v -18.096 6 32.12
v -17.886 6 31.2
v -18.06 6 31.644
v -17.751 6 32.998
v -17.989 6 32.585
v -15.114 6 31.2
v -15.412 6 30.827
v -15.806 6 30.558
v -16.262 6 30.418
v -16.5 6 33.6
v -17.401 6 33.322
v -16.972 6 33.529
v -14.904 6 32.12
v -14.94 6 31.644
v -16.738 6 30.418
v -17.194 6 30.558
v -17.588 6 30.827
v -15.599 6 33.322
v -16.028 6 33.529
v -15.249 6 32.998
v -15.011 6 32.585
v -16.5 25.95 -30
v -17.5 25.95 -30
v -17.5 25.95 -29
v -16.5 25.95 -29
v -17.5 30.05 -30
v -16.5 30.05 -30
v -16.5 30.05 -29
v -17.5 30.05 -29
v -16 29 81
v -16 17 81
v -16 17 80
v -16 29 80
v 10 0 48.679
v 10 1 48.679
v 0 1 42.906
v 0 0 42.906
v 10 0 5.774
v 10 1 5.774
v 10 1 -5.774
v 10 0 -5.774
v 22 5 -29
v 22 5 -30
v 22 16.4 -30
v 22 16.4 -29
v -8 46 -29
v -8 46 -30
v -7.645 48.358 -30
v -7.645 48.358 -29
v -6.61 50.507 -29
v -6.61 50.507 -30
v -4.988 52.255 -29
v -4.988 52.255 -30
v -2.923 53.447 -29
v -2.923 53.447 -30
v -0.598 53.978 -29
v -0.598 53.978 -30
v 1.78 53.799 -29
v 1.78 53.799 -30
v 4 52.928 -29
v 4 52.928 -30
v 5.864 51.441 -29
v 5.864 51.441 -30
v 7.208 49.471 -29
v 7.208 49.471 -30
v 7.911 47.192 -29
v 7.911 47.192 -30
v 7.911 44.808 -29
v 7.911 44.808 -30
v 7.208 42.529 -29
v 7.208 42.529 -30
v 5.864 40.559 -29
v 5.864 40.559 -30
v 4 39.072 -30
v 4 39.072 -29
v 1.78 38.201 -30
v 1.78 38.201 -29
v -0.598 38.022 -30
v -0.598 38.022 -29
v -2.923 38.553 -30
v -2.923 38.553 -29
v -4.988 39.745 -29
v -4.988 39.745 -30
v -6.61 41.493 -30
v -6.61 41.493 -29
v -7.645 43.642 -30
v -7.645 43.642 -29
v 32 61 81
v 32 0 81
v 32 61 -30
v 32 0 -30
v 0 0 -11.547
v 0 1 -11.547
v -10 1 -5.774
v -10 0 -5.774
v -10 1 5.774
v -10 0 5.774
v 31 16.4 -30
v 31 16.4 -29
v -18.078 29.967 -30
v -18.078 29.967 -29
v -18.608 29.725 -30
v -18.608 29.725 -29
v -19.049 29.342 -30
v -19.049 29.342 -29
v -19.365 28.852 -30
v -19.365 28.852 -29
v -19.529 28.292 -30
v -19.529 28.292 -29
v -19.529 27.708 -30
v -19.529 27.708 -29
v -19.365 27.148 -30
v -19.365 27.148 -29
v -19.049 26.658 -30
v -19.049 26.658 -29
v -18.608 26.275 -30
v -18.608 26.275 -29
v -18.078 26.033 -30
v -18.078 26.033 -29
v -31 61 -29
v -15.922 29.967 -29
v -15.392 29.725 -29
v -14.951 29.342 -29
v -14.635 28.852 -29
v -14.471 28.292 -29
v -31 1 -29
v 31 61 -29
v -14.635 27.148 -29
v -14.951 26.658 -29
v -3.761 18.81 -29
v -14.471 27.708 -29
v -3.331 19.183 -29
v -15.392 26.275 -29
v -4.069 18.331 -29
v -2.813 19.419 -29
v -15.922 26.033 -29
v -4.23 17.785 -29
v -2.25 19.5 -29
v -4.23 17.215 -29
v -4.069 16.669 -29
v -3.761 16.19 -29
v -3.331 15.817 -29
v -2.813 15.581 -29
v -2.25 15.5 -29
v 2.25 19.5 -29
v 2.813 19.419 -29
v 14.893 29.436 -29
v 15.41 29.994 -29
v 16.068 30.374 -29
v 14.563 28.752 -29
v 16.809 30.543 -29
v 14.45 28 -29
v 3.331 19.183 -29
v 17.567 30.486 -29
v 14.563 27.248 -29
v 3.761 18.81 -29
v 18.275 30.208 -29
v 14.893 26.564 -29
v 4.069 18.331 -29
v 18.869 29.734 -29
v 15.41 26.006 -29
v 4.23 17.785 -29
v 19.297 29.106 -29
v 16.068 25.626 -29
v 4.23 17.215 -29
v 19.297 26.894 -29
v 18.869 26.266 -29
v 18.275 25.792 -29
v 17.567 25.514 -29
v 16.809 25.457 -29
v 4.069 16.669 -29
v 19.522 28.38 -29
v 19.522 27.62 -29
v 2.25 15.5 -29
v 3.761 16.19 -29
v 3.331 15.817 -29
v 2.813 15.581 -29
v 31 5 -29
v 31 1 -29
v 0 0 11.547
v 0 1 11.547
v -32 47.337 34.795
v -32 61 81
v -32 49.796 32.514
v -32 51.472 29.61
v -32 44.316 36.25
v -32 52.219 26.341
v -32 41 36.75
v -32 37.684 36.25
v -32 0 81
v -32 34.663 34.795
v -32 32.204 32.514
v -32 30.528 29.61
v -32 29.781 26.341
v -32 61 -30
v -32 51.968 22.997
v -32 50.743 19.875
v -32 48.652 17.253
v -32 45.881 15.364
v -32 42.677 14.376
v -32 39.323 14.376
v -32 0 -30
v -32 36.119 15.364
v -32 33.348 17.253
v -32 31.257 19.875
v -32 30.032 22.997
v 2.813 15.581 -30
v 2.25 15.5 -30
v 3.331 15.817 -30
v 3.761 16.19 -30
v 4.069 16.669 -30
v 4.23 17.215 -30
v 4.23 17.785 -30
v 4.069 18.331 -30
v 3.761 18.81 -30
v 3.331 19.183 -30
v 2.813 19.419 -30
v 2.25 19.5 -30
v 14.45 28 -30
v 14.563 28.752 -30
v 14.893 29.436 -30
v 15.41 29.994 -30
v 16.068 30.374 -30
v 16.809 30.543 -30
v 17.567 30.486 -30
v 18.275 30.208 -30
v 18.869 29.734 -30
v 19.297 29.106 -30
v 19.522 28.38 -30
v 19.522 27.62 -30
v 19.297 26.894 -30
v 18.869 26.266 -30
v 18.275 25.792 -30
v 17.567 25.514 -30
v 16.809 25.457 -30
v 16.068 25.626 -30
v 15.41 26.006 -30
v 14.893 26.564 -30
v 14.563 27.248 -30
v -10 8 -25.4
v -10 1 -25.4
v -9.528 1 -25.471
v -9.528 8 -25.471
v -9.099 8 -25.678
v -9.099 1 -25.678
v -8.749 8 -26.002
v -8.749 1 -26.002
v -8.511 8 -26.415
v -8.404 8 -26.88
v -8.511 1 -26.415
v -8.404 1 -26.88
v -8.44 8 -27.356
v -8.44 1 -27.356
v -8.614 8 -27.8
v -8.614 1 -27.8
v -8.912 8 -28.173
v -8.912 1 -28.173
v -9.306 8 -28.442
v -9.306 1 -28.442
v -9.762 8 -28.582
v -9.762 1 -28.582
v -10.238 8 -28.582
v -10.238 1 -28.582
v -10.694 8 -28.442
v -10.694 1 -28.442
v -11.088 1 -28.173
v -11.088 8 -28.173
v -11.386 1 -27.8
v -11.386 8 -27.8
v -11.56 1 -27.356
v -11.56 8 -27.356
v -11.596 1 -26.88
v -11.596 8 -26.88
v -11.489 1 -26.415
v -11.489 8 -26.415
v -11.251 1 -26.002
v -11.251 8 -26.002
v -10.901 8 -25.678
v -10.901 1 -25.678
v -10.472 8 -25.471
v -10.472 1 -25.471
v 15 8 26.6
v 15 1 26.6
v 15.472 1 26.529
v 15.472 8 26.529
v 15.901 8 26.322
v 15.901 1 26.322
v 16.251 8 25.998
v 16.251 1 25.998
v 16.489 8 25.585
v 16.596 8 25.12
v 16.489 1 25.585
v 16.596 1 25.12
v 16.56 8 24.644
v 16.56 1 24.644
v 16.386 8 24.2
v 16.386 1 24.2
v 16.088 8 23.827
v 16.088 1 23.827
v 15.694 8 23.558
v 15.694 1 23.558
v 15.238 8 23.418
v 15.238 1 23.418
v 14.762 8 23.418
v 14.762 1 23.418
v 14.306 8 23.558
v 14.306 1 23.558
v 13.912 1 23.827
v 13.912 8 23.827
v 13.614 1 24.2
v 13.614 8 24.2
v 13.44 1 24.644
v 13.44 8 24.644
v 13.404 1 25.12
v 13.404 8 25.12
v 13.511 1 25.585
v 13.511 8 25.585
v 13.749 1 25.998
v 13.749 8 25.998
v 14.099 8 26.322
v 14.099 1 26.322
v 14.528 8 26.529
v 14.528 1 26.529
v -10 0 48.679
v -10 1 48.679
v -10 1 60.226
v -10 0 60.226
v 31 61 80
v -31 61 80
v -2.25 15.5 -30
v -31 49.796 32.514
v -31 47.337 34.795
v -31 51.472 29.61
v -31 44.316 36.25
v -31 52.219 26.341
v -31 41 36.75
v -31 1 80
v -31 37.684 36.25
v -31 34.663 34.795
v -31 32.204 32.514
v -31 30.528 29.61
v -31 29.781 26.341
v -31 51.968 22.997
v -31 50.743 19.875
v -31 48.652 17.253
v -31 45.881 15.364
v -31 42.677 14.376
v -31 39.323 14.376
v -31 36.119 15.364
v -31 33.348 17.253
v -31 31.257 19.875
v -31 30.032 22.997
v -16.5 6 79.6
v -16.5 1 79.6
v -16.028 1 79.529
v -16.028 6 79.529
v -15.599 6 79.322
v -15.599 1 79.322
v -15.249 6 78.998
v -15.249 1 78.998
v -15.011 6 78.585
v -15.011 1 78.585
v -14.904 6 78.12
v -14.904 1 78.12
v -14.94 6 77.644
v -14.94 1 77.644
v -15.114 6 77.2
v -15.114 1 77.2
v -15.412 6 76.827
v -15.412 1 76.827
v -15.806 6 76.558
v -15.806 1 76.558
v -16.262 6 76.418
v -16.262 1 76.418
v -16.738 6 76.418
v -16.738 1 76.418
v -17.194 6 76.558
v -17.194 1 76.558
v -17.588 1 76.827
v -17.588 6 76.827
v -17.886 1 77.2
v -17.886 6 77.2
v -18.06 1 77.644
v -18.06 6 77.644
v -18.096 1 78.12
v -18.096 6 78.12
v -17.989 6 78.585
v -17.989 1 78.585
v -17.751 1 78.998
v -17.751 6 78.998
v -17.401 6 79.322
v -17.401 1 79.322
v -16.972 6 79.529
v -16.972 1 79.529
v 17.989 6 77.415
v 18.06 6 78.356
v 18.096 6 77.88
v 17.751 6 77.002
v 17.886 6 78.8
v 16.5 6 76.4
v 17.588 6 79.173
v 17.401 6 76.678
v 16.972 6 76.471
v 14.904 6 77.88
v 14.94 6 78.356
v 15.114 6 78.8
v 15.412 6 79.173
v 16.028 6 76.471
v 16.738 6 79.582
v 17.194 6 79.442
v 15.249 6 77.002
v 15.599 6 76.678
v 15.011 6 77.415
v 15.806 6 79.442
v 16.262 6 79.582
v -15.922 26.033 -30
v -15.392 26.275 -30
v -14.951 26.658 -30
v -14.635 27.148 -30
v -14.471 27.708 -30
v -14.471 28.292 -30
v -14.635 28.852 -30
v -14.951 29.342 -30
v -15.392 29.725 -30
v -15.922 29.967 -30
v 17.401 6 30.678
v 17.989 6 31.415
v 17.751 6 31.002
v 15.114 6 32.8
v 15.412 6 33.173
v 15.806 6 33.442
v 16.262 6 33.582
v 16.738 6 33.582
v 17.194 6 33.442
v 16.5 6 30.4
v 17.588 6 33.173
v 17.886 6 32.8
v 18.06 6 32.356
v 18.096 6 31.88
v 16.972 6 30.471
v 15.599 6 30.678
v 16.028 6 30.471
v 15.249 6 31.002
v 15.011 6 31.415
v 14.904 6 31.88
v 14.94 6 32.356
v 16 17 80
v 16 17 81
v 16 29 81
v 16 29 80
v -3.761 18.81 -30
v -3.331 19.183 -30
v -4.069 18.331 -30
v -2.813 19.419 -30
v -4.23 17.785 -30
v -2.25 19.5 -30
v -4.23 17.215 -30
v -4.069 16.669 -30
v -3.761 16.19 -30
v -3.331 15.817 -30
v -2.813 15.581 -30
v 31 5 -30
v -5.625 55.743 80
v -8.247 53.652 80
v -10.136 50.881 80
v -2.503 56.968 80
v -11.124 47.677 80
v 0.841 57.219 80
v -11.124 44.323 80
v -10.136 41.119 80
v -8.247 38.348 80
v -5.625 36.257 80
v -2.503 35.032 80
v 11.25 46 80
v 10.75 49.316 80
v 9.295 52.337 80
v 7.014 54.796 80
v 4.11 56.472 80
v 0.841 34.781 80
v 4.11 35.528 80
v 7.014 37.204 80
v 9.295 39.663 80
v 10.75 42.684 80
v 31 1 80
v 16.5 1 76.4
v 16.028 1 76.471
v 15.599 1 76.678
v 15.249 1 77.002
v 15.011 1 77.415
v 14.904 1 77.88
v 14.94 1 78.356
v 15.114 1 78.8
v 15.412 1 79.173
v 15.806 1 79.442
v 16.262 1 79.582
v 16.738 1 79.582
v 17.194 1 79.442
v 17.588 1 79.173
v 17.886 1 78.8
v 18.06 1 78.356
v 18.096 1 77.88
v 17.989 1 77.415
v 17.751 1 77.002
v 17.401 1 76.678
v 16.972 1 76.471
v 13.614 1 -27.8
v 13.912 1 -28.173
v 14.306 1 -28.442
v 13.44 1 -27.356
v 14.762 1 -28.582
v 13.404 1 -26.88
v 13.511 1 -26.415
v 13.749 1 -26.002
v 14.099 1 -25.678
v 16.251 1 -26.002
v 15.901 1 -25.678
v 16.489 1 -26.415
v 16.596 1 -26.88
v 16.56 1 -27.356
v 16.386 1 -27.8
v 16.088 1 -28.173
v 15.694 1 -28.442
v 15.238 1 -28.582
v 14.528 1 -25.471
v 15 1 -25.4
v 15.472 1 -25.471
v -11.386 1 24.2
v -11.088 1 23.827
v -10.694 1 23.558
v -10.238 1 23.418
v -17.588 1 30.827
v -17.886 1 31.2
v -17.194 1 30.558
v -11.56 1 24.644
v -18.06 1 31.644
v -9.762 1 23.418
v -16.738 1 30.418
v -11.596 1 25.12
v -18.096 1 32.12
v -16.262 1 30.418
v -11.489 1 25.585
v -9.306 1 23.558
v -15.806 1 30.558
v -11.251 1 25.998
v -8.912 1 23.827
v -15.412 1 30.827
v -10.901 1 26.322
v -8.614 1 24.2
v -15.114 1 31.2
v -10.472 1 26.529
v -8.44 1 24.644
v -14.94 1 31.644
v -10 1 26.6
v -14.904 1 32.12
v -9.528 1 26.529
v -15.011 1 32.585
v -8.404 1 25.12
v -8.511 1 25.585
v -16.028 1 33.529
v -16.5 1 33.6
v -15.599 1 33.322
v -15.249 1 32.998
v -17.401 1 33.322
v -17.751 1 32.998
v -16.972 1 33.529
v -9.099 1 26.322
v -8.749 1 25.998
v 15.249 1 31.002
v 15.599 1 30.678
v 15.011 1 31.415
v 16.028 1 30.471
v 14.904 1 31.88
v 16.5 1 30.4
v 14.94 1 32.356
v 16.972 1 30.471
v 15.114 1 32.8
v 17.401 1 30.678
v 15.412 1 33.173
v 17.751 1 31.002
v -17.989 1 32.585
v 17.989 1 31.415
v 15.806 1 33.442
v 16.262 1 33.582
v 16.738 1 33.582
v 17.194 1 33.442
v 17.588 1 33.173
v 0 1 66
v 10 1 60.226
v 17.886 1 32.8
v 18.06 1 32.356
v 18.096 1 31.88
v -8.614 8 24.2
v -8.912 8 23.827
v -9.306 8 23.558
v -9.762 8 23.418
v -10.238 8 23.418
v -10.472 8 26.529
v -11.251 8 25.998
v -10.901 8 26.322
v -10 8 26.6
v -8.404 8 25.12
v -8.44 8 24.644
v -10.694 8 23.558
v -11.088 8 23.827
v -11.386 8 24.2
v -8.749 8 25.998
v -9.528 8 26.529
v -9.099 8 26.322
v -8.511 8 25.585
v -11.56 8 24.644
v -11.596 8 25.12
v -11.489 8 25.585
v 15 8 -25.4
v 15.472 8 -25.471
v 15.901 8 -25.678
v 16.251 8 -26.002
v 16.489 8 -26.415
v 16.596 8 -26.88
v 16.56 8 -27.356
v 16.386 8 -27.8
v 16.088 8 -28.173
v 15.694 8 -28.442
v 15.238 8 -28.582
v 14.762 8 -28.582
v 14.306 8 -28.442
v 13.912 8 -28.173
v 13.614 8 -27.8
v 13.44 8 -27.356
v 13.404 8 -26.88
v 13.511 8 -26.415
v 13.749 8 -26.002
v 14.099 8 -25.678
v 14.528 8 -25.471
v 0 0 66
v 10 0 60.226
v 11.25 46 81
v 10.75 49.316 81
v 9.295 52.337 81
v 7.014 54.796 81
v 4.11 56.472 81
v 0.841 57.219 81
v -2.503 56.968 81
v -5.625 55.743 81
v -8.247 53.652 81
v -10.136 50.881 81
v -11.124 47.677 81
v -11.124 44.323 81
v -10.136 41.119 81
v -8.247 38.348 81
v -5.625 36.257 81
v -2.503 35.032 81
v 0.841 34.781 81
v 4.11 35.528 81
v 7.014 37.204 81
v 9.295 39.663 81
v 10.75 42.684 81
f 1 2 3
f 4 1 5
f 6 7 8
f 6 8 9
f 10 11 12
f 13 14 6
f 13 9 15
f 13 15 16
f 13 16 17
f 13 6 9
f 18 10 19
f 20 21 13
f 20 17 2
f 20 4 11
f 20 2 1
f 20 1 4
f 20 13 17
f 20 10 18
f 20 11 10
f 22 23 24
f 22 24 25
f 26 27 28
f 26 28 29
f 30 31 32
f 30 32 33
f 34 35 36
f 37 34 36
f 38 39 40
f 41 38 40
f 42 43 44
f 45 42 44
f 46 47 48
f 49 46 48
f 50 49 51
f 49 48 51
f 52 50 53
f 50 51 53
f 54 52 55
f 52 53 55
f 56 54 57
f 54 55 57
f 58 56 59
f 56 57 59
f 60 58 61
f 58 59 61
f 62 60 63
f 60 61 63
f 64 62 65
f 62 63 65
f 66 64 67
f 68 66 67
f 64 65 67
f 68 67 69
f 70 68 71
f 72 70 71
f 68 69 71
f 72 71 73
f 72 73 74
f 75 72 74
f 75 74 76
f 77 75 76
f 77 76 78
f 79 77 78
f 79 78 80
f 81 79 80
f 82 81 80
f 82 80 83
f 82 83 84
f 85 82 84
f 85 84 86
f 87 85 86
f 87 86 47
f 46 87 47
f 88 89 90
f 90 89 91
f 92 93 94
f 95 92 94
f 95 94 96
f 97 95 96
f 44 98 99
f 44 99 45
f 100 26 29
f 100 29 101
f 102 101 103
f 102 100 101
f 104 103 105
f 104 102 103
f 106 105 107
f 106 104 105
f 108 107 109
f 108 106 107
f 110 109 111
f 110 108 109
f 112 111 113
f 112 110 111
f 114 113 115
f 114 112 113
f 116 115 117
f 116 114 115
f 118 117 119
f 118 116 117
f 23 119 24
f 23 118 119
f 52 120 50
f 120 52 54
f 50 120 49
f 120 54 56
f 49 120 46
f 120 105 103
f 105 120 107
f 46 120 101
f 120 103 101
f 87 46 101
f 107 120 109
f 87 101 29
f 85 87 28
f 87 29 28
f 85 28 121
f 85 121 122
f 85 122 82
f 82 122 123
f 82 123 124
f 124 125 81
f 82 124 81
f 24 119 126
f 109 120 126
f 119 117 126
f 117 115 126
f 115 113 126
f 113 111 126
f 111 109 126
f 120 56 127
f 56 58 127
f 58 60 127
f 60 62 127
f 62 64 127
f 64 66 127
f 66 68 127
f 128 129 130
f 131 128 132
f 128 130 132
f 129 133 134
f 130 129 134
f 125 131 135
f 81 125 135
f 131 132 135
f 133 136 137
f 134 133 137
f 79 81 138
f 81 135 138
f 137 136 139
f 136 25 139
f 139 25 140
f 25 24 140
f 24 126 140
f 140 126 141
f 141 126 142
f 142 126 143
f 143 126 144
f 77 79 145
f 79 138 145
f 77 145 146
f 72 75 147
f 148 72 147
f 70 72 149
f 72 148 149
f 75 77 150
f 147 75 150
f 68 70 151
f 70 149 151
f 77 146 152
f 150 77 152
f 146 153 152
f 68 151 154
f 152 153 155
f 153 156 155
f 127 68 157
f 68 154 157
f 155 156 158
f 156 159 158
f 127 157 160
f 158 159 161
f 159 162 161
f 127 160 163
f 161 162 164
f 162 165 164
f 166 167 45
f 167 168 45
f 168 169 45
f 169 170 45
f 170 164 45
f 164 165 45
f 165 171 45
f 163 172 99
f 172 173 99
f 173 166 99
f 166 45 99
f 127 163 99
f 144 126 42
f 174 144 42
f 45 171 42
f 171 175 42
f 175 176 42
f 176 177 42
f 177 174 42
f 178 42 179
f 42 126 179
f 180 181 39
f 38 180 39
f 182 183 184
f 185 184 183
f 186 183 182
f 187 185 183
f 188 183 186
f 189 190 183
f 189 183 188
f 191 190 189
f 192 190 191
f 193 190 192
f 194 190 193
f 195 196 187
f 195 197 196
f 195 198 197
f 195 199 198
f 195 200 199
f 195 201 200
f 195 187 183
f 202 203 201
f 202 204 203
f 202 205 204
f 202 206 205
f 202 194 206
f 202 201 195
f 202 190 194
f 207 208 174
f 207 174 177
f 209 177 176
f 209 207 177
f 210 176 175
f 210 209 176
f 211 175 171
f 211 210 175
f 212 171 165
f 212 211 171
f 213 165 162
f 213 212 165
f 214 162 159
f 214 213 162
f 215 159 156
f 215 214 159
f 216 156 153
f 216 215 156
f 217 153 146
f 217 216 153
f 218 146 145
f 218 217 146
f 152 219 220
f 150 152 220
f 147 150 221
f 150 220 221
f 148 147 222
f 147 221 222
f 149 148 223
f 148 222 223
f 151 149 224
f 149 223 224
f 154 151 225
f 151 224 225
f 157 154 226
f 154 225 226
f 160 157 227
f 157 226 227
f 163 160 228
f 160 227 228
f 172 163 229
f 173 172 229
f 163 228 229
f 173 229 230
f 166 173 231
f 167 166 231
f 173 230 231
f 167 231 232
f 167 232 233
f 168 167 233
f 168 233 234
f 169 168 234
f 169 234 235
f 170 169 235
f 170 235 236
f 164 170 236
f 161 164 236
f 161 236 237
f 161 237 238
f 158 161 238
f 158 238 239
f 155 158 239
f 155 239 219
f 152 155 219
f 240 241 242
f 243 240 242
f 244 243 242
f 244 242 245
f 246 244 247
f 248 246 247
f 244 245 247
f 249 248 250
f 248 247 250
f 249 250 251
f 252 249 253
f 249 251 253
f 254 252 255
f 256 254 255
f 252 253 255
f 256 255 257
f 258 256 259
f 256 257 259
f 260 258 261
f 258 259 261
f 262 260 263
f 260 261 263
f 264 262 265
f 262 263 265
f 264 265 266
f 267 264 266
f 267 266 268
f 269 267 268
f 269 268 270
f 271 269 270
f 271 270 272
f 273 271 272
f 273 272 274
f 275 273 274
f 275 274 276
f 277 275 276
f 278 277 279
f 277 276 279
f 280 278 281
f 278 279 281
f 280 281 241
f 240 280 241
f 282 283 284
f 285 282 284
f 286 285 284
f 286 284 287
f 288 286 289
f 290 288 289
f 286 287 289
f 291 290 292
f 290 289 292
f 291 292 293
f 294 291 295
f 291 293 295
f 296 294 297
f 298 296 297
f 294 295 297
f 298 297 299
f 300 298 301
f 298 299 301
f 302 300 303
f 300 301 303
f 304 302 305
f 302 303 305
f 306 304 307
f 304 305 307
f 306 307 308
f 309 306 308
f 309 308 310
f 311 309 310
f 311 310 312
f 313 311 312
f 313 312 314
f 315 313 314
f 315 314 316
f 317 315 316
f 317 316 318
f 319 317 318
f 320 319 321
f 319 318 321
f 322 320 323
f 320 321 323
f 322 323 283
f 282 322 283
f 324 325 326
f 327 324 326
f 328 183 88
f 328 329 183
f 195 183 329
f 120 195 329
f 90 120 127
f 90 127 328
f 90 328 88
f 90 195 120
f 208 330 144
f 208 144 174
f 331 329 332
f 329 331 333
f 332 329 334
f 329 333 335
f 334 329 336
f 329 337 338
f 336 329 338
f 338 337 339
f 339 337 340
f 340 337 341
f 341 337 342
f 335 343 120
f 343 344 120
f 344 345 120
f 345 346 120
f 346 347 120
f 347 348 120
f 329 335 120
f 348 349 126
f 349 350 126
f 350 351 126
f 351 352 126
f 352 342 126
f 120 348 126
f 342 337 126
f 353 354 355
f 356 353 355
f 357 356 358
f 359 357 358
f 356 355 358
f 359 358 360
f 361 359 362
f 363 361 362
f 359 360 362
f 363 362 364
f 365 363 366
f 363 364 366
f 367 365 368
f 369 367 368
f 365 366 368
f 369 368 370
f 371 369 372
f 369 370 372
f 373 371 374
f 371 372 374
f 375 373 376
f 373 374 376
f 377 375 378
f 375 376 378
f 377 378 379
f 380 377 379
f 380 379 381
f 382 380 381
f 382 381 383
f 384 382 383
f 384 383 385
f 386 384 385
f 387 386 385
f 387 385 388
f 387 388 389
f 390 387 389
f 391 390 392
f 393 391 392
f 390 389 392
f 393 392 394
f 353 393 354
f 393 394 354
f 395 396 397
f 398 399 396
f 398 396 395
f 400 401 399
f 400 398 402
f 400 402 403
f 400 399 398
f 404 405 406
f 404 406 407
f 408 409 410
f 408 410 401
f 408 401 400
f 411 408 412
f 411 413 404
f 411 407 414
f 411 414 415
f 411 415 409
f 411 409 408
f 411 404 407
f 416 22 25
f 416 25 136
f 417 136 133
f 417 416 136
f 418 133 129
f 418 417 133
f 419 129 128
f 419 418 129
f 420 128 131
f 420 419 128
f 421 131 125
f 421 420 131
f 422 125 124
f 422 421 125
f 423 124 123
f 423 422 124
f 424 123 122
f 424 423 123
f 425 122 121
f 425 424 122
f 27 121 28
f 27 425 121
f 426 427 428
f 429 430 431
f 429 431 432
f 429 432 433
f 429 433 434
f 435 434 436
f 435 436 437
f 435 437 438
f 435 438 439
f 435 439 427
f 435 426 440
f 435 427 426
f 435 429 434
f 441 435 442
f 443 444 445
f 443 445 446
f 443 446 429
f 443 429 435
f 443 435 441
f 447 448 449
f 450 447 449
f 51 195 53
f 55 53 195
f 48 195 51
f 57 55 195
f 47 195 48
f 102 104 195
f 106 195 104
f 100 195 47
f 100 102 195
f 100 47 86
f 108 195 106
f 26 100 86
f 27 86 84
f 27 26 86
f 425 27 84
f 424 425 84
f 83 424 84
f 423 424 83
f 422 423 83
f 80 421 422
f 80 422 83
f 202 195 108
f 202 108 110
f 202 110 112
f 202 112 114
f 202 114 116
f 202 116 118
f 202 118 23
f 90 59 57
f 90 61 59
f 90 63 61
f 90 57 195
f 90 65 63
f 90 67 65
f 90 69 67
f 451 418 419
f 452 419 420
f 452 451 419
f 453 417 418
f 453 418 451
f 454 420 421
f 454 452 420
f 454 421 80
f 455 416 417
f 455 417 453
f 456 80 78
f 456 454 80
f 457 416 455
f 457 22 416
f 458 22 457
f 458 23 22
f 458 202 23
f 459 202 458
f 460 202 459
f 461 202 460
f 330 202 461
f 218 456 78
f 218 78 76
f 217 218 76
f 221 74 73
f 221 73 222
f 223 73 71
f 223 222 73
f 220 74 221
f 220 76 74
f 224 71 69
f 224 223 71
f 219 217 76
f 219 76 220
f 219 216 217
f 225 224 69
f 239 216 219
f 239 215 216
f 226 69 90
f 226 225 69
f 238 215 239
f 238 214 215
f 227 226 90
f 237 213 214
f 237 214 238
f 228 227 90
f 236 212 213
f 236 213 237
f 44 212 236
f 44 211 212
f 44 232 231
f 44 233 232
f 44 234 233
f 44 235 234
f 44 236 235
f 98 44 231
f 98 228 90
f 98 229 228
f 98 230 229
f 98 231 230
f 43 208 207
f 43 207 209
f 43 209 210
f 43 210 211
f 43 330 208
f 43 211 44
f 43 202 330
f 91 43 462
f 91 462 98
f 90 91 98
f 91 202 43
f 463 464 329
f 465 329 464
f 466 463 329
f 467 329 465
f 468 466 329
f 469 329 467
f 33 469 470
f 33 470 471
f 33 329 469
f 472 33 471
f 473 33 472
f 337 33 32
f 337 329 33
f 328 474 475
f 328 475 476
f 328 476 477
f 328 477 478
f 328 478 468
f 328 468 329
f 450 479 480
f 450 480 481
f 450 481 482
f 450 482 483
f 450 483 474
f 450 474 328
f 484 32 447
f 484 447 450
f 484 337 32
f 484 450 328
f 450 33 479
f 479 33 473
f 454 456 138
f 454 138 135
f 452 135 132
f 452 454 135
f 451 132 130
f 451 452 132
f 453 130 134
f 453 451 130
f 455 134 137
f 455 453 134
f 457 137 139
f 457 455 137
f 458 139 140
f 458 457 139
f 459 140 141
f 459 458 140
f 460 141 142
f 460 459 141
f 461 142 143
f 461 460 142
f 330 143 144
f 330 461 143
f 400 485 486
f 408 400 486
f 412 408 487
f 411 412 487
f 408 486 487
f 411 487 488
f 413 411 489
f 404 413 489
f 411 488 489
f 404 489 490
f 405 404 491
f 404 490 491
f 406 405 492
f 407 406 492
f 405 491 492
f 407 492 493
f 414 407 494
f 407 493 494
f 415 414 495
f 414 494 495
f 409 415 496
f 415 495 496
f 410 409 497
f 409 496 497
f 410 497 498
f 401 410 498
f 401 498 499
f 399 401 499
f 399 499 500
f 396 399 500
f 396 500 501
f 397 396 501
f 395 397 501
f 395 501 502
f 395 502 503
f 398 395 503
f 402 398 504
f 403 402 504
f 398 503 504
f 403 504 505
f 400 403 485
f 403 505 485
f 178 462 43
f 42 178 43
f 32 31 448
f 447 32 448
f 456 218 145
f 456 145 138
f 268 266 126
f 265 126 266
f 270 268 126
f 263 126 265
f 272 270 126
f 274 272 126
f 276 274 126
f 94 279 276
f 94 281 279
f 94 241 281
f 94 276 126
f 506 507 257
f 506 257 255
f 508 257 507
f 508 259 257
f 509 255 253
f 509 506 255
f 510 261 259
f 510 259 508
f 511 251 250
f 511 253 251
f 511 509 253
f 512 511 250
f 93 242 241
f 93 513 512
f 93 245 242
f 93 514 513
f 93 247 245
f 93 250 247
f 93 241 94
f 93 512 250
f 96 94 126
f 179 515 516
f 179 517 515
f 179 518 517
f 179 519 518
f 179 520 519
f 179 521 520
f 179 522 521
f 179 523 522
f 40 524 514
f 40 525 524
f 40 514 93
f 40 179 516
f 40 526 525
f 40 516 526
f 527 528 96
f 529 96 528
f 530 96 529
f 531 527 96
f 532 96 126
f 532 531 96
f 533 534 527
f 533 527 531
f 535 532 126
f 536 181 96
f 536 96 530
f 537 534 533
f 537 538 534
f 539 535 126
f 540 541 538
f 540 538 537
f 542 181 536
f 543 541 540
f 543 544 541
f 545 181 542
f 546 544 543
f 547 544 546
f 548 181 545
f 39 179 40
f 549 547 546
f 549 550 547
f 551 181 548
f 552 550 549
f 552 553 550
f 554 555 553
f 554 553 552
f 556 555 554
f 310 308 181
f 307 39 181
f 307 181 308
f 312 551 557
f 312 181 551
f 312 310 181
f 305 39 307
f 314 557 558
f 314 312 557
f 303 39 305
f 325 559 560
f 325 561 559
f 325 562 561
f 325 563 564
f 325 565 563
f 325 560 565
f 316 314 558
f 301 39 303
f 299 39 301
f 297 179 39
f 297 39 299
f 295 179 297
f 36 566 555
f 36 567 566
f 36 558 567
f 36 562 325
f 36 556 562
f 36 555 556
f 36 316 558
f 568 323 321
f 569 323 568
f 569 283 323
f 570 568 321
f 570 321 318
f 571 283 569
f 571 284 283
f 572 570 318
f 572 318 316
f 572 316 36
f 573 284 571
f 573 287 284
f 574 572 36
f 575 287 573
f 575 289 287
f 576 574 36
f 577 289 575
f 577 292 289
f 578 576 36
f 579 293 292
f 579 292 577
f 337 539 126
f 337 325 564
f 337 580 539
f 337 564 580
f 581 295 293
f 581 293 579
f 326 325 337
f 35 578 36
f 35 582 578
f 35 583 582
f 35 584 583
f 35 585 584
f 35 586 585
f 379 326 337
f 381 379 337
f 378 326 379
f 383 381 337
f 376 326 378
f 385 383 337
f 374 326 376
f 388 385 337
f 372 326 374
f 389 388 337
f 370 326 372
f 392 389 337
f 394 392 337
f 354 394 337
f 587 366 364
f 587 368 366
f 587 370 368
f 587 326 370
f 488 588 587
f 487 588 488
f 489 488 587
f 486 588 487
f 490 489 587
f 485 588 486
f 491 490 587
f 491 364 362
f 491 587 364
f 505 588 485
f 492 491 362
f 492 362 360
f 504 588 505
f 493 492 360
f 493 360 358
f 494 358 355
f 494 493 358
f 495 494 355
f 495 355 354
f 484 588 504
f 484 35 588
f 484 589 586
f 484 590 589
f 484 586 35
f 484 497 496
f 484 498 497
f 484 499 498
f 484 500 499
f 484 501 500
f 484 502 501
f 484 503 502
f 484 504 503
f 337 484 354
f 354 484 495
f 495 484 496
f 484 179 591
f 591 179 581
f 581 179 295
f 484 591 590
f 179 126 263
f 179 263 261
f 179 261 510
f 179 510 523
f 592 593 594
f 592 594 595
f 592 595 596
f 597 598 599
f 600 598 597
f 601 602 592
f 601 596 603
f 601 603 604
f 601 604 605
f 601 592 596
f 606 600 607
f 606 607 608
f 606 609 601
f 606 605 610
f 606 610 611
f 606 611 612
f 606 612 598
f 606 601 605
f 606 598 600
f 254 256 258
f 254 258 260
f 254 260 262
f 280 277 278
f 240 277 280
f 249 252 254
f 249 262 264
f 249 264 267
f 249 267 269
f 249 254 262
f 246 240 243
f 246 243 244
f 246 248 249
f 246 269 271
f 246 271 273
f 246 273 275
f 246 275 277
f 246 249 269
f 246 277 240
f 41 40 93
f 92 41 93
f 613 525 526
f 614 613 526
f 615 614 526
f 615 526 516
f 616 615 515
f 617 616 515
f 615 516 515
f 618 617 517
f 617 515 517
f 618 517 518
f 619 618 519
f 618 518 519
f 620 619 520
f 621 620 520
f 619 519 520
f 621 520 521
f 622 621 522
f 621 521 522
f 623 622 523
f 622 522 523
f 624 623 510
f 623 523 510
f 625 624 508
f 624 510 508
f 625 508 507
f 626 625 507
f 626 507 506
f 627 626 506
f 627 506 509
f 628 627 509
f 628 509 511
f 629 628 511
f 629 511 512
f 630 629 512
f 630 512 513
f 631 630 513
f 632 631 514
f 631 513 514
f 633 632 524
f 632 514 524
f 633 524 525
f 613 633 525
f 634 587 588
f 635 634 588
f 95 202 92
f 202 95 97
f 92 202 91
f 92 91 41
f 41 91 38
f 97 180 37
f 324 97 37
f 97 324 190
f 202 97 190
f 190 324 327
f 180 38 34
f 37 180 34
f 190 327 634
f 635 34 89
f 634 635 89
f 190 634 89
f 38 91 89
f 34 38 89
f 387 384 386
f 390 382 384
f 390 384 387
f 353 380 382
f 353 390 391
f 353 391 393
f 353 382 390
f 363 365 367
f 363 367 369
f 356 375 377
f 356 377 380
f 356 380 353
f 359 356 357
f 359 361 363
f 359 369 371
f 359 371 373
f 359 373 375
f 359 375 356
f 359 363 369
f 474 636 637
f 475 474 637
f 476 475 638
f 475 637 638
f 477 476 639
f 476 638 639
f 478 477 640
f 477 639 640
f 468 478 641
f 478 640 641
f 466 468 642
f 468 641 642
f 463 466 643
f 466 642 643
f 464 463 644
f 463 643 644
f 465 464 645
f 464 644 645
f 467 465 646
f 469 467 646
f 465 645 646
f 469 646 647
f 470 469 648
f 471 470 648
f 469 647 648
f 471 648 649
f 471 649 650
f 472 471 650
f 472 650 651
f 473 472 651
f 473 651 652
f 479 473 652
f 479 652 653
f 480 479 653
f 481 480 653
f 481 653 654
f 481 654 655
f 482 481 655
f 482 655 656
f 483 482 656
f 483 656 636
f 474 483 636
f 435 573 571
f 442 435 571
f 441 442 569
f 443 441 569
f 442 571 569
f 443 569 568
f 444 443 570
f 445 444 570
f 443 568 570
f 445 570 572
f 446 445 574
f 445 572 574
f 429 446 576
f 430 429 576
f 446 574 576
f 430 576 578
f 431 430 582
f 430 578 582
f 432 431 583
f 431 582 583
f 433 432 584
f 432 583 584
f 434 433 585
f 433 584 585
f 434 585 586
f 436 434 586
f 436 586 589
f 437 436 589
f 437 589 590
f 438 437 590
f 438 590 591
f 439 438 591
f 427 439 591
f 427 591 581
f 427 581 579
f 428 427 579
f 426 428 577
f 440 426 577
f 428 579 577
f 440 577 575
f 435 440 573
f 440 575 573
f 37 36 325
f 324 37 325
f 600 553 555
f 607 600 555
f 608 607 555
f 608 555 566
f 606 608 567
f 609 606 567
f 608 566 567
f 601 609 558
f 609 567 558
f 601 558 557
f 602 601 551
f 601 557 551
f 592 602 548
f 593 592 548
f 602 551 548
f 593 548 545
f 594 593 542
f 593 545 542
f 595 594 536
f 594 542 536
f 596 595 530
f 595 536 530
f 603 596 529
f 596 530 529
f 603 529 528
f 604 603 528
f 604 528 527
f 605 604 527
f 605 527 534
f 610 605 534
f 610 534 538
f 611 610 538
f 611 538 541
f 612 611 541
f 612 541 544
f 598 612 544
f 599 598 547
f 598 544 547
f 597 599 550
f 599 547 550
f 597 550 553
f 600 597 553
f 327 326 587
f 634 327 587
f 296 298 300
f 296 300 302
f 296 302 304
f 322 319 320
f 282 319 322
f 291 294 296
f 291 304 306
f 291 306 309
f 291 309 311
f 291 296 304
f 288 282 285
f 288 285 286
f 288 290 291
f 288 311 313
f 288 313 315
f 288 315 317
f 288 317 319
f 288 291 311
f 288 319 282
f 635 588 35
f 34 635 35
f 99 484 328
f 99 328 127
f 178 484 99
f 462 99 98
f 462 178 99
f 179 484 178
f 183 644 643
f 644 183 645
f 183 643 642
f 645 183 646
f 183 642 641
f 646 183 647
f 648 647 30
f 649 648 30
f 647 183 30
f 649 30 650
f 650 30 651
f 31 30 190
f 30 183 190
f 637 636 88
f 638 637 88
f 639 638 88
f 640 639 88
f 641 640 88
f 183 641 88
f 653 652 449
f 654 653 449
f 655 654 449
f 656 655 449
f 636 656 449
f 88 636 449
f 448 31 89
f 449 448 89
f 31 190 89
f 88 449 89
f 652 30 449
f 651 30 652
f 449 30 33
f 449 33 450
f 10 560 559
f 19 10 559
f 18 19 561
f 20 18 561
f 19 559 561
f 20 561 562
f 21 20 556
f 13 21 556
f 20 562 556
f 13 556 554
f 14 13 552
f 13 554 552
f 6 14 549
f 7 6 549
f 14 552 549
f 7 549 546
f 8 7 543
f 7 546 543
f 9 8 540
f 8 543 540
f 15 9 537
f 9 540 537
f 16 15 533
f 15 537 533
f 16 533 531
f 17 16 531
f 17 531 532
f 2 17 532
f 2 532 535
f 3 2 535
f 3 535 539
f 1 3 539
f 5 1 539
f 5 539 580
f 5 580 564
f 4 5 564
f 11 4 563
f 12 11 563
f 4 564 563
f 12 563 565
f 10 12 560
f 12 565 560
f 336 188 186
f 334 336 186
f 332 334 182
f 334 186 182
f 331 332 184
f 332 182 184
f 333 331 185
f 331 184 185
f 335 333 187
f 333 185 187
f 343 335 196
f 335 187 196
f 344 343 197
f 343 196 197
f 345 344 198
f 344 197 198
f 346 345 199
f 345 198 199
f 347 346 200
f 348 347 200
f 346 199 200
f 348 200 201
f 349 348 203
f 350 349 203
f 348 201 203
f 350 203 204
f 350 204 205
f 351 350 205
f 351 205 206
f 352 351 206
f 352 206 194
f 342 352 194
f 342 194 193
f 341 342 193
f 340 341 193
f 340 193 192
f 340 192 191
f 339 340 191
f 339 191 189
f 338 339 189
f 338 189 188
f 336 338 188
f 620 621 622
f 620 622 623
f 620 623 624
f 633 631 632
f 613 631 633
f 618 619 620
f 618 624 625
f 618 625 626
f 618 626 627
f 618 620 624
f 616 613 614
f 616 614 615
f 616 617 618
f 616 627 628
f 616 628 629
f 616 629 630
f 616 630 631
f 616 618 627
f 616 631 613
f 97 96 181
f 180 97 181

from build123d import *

# Parameters (mm, degrees)
IZIM1_W                     = 60
IZIM1_H                     = 60
Y_KSEKLIK_EKSTR_ZYON1_DEPTH = 1
IZIM2_R                     = 1.6
Y_KSEKLIK_EKSTR_ZYON2_DEPTH = 7
IZIM3_W                     = 60
IZIM3_H                     = 1
Y_KSEKLIK_EKSTR_ZYON3_DEPTH = 2
IZIM4_W                     = 39
IZIM4_H                     = 1
Y_KSEKLIK_EKSTR_ZYON4_DEPTH = 51
IZIM5_R                     = 1.6
Y_KSEKLIK_EKSTR_ZYON5_DEPTH = 5
IZIM6_W                     = 51
IZIM6_H                     = 1
Y_KSEKLIK_EKSTR_ZYON6_DEPTH = 12.5
IZIM7_W                     = 51
IZIM7_H                     = 1
Y_KSEKLIK_EKSTR_ZYON7_DEPTH = 12.5
KES_EKSTR_ZYON1_DEPTH       = 88.372764635
IZIM9_W                     = 64
IZIM9_H                     = 111
IZIM9_W_2                   = 62
IZIM9_H_2                   = 109
Y_KSEKLIK_EKSTR_ZYON8_DEPTH = 60
KES_EKSTR_ZYON2_REACH       = 132.637
IZIM10_R                    = 11.25
IZIM10_W                    = 32
IZIM10_H                    = 12
KES_EKSTR_ZYON3_REACH       = 121.908
IZIM11_R                    = 11.25
KES_EKSTR_ZYON4_REACH       = 132.637
IZIM12_R                    = 8
IZIM12_R_2                  = 2.55
KES_EKSTR_ZYON5_REACH       = 132.637
IZIM14_W                    = 9
IZIM14_H                    = 11.4


with BuildPart() as part:
    # Çizim1 → Yükseklik-Ekstrüzyon1 (new body)
    with BuildSketch(Plane(origin=(0, 0, 0), x_dir=(1, 0, 0), z_dir=(0, 1, 0))):
        Rectangle(IZIM1_W, IZIM1_H)
    extrude(amount=Y_KSEKLIK_EKSTR_ZYON1_DEPTH)

    # Çizim2 → Yükseklik-Ekstrüzyon2 (add)
    with BuildSketch(Plane(origin=(0, 1, 0), x_dir=(1, 0, 0), z_dir=(0, 1, 0))):
        with Locations(Location((-10, -25, 0), (0, 0, 270))):
            Circle(IZIM2_R)
        with Locations(Location((15, -25, 0), (0, 0, 270))):
            Circle(IZIM2_R)
        with Locations(Location((-10, 27, 0), (0, 0, 270))):
            Circle(IZIM2_R)
        with Locations(Location((15, 27, 0), (0, 0, 270))):
            Circle(IZIM2_R)
    extrude(amount=Y_KSEKLIK_EKSTR_ZYON2_DEPTH)

    # Çizim3 → Yükseklik-Ekstrüzyon3 (add)
    with BuildSketch(Plane(origin=(30, 0, 0), x_dir=(0, 0, -1), z_dir=(1, 0, 0))):
        with Locations((0, 0.5)):
            Rectangle(IZIM3_W, IZIM3_H)
    y_kseklik_ekstr_zyon3 = extrude(amount=Y_KSEKLIK_EKSTR_ZYON3_DEPTH)

    # Aynalama1: Yükseklik-Ekstrüzyon3 across plane
    add(y_kseklik_ekstr_zyon3.mirror(Plane(origin=(0, 0, 0), x_dir=(0, 0, 1), z_dir=(1, 0, 0))))

    # Çizim4 → Yükseklik-Ekstrüzyon4 (add)
    with BuildSketch(Plane.XY.offset(30)):
        with Locations((0, 0.5)):
            Rectangle(IZIM4_W, IZIM4_H)
    extrude(amount=Y_KSEKLIK_EKSTR_ZYON4_DEPTH)

    # Çizim5 → Yükseklik-Ekstrüzyon5 (add)
    with BuildSketch(Plane(origin=(0, 1, 0), x_dir=(1, 0, 0), z_dir=(0, 1, 0))):
        with Locations(Location((-16.5, -32, 0), (0, 0, 270))):
            Circle(IZIM5_R)
        with Locations(Location((16.5, -32, 0), (0, 0, 90))):
            Circle(IZIM5_R)
        with Locations(Location((-16.5, -78, 0), (0, 0, 270))):
            Circle(IZIM5_R)
        with Locations(Location((16.5, -78, 0), (0, 0, 90))):
            Circle(IZIM5_R)
    extrude(amount=Y_KSEKLIK_EKSTR_ZYON5_DEPTH)

    # Çizim6 → Yükseklik-Ekstrüzyon6 (add)
    with BuildSketch(Plane(origin=(19.5, 0, 0), x_dir=(0, 0, -1), z_dir=(1, 0, 0))):
        with Locations((-55.5, 0.5)):
            Rectangle(IZIM6_W, IZIM6_H)
    extrude(amount=Y_KSEKLIK_EKSTR_ZYON6_DEPTH)

    # Çizim7 → Yükseklik-Ekstrüzyon7 (add)
    with BuildSketch(Plane.ZY.offset(19.5)):
        with Locations((55.5, 0.5)):
            Rectangle(IZIM7_W, IZIM7_H)
    extrude(amount=Y_KSEKLIK_EKSTR_ZYON7_DEPTH)

    # Çizim8 → Kes-Ekstrüzyon1 (cut, through all)
    with BuildSketch(Plane(origin=(0, 1, 0), x_dir=(1, 0, 0), z_dir=(0, 1, 0))):
        Polygon((-10, -5.773502692), (0, -11.547005384), (10, -5.773502692), (10, 5.773502692), (0, 11.547005384), (-10, 5.773502692), align=None)
        Polygon((-10, -60.226497308), (0, -66), (10, -60.226497308), (10, -48.679491924), (0, -42.905989232), (-10, -48.679491924), align=None)
    extrude(amount=-KES_EKSTR_ZYON1_DEPTH, mode=Mode.SUBTRACT)

    # Çizim9 → Yükseklik-Ekstrüzyon8 (add)
    with BuildSketch(Plane(origin=(0, 1, 0), x_dir=(1, 0, 0), z_dir=(0, 1, 0))):
        with Locations((0, -25.5)):
            Rectangle(IZIM9_W, IZIM9_H)
        with Locations((0, -25.5)):
            Rectangle(IZIM9_W_2, IZIM9_H_2, mode=Mode.SUBTRACT)
    extrude(amount=Y_KSEKLIK_EKSTR_ZYON8_DEPTH)

    # Çizim10 → Kes-Ekstrüzyon2 (cut, up to next)
    with BuildSketch(Plane.XY.offset(81), mode=Mode.PRIVATE) as kes_ekstr_zyon2_sk1:
        with Locations((0, 46)):
            Circle(IZIM10_R)
    kes_ekstr_zyon2_tool1 = extrude(kes_ekstr_zyon2_sk1.sketch, amount=-KES_EKSTR_ZYON2_REACH, mode=Mode.PRIVATE) & part.part
    # Çizim10 → Kes-Ekstrüzyon2 (cut, up to next)
    with BuildSketch(Plane.XY.offset(81), mode=Mode.PRIVATE) as kes_ekstr_zyon2_sk2:
        with Locations((0, 23)):
            Rectangle(IZIM10_W, IZIM10_H)
    kes_ekstr_zyon2_tool2 = extrude(kes_ekstr_zyon2_sk2.sketch, amount=-KES_EKSTR_ZYON2_REACH, mode=Mode.PRIVATE) & part.part
    add(kes_ekstr_zyon2_tool1.solids().sort_by_distance((0, 46, 81))[0], mode=Mode.SUBTRACT)
    add(kes_ekstr_zyon2_tool2.solids().sort_by_distance((0, 23, 81))[0], mode=Mode.SUBTRACT)

    # Çizim11 → Kes-Ekstrüzyon3 (cut, up to next)
    with BuildSketch(Plane.ZY.offset(32), mode=Mode.PRIVATE) as kes_ekstr_zyon3_sk1:
        with Locations((25.5, 41)):
            Circle(IZIM11_R)
    kes_ekstr_zyon3_tool1 = extrude(kes_ekstr_zyon3_sk1.sketch, amount=-KES_EKSTR_ZYON3_REACH, mode=Mode.PRIVATE) & part.part
    add(kes_ekstr_zyon3_tool1.solids().sort_by_distance((-32, 41, 25.5))[0], mode=Mode.SUBTRACT)

    # Çizim12 → Kes-Ekstrüzyon4 (cut, up to next)
    with BuildSketch(Plane(origin=(0, 0, -30), x_dir=(-1, 0, 0), z_dir=(0, 0, -1)), mode=Mode.PRIVATE) as kes_ekstr_zyon4_sk1:
        with Locations((0, 46)):
            Circle(IZIM12_R)
    kes_ekstr_zyon4_tool1 = extrude(kes_ekstr_zyon4_sk1.sketch, amount=-KES_EKSTR_ZYON4_REACH, mode=Mode.PRIVATE) & part.part
    # Çizim12 → Kes-Ekstrüzyon4 (cut, up to next)
    with BuildSketch(Plane(origin=(0, 0, -30), x_dir=(-1, 0, 0), z_dir=(0, 0, -1)), mode=Mode.PRIVATE) as kes_ekstr_zyon4_sk2:
        with Locations((-17, 28)):
            Circle(IZIM12_R_2)
    kes_ekstr_zyon4_tool2 = extrude(kes_ekstr_zyon4_sk2.sketch, amount=-KES_EKSTR_ZYON4_REACH, mode=Mode.PRIVATE) & part.part
    # Çizim12 → Kes-Ekstrüzyon4 (cut, up to next)
    with BuildSketch(Plane(origin=(0, 0, -30), x_dir=(-1, 0, 0), z_dir=(0, 0, -1)), mode=Mode.PRIVATE) as kes_ekstr_zyon4_sk3:
        with BuildLine():
            Line((16.5, 30.05), (17.5, 30.05))
            ThreePointArc((17.5, 30.05), (19.55, 28), (17.5, 25.95))
            Line((17.5, 25.95), (16.5, 25.95))
            ThreePointArc((16.5, 25.95), (14.45, 28), (16.5, 30.05))
        make_face()
    kes_ekstr_zyon4_tool3 = extrude(kes_ekstr_zyon4_sk3.sketch, amount=-KES_EKSTR_ZYON4_REACH, mode=Mode.PRIVATE) & part.part
    add(kes_ekstr_zyon4_tool1.solids().sort_by_distance((0, 46, -30))[0], mode=Mode.SUBTRACT)
    add(kes_ekstr_zyon4_tool2.solids().sort_by_distance((17, 28, -30))[0], mode=Mode.SUBTRACT)
    add(kes_ekstr_zyon4_tool3.solids().sort_by_distance((-17, 28, -30))[0], mode=Mode.SUBTRACT)

    # Çizim14 → Kes-Ekstrüzyon5 (cut, up to next)
    with BuildSketch(Plane(origin=(0, 0, -30), x_dir=(-1, 0, 0), z_dir=(0, 0, -1)), mode=Mode.PRIVATE) as kes_ekstr_zyon5_sk1:
        with Locations((-26.5, 10.7)):
            Rectangle(IZIM14_W, IZIM14_H)
    kes_ekstr_zyon5_tool1 = extrude(kes_ekstr_zyon5_sk1.sketch, amount=-KES_EKSTR_ZYON5_REACH, mode=Mode.PRIVATE) & part.part
    # Çizim14 → Kes-Ekstrüzyon5 (cut, up to next)
    with BuildSketch(Plane(origin=(0, 0, -30), x_dir=(-1, 0, 0), z_dir=(0, 0, -1)), mode=Mode.PRIVATE) as kes_ekstr_zyon5_sk2:
        with BuildLine():
            Line((-2.25, 19.5), (2.25, 19.5))
            ThreePointArc((2.25, 19.5), (4.25, 17.5), (2.25, 15.5))
            Line((2.25, 15.5), (-2.25, 15.5))
            ThreePointArc((-2.25, 15.5), (-4.25, 17.5), (-2.25, 19.5))
        make_face()
    kes_ekstr_zyon5_tool2 = extrude(kes_ekstr_zyon5_sk2.sketch, amount=-KES_EKSTR_ZYON5_REACH, mode=Mode.PRIVATE) & part.part
    add(kes_ekstr_zyon5_tool1.solids().sort_by_distance((26.5, 10.7, -30))[0], mode=Mode.SUBTRACT)
    add(kes_ekstr_zyon5_tool2.solids().sort_by_distance((0, 17.5, -30))[0], mode=Mode.SUBTRACT)


solid = part.part
